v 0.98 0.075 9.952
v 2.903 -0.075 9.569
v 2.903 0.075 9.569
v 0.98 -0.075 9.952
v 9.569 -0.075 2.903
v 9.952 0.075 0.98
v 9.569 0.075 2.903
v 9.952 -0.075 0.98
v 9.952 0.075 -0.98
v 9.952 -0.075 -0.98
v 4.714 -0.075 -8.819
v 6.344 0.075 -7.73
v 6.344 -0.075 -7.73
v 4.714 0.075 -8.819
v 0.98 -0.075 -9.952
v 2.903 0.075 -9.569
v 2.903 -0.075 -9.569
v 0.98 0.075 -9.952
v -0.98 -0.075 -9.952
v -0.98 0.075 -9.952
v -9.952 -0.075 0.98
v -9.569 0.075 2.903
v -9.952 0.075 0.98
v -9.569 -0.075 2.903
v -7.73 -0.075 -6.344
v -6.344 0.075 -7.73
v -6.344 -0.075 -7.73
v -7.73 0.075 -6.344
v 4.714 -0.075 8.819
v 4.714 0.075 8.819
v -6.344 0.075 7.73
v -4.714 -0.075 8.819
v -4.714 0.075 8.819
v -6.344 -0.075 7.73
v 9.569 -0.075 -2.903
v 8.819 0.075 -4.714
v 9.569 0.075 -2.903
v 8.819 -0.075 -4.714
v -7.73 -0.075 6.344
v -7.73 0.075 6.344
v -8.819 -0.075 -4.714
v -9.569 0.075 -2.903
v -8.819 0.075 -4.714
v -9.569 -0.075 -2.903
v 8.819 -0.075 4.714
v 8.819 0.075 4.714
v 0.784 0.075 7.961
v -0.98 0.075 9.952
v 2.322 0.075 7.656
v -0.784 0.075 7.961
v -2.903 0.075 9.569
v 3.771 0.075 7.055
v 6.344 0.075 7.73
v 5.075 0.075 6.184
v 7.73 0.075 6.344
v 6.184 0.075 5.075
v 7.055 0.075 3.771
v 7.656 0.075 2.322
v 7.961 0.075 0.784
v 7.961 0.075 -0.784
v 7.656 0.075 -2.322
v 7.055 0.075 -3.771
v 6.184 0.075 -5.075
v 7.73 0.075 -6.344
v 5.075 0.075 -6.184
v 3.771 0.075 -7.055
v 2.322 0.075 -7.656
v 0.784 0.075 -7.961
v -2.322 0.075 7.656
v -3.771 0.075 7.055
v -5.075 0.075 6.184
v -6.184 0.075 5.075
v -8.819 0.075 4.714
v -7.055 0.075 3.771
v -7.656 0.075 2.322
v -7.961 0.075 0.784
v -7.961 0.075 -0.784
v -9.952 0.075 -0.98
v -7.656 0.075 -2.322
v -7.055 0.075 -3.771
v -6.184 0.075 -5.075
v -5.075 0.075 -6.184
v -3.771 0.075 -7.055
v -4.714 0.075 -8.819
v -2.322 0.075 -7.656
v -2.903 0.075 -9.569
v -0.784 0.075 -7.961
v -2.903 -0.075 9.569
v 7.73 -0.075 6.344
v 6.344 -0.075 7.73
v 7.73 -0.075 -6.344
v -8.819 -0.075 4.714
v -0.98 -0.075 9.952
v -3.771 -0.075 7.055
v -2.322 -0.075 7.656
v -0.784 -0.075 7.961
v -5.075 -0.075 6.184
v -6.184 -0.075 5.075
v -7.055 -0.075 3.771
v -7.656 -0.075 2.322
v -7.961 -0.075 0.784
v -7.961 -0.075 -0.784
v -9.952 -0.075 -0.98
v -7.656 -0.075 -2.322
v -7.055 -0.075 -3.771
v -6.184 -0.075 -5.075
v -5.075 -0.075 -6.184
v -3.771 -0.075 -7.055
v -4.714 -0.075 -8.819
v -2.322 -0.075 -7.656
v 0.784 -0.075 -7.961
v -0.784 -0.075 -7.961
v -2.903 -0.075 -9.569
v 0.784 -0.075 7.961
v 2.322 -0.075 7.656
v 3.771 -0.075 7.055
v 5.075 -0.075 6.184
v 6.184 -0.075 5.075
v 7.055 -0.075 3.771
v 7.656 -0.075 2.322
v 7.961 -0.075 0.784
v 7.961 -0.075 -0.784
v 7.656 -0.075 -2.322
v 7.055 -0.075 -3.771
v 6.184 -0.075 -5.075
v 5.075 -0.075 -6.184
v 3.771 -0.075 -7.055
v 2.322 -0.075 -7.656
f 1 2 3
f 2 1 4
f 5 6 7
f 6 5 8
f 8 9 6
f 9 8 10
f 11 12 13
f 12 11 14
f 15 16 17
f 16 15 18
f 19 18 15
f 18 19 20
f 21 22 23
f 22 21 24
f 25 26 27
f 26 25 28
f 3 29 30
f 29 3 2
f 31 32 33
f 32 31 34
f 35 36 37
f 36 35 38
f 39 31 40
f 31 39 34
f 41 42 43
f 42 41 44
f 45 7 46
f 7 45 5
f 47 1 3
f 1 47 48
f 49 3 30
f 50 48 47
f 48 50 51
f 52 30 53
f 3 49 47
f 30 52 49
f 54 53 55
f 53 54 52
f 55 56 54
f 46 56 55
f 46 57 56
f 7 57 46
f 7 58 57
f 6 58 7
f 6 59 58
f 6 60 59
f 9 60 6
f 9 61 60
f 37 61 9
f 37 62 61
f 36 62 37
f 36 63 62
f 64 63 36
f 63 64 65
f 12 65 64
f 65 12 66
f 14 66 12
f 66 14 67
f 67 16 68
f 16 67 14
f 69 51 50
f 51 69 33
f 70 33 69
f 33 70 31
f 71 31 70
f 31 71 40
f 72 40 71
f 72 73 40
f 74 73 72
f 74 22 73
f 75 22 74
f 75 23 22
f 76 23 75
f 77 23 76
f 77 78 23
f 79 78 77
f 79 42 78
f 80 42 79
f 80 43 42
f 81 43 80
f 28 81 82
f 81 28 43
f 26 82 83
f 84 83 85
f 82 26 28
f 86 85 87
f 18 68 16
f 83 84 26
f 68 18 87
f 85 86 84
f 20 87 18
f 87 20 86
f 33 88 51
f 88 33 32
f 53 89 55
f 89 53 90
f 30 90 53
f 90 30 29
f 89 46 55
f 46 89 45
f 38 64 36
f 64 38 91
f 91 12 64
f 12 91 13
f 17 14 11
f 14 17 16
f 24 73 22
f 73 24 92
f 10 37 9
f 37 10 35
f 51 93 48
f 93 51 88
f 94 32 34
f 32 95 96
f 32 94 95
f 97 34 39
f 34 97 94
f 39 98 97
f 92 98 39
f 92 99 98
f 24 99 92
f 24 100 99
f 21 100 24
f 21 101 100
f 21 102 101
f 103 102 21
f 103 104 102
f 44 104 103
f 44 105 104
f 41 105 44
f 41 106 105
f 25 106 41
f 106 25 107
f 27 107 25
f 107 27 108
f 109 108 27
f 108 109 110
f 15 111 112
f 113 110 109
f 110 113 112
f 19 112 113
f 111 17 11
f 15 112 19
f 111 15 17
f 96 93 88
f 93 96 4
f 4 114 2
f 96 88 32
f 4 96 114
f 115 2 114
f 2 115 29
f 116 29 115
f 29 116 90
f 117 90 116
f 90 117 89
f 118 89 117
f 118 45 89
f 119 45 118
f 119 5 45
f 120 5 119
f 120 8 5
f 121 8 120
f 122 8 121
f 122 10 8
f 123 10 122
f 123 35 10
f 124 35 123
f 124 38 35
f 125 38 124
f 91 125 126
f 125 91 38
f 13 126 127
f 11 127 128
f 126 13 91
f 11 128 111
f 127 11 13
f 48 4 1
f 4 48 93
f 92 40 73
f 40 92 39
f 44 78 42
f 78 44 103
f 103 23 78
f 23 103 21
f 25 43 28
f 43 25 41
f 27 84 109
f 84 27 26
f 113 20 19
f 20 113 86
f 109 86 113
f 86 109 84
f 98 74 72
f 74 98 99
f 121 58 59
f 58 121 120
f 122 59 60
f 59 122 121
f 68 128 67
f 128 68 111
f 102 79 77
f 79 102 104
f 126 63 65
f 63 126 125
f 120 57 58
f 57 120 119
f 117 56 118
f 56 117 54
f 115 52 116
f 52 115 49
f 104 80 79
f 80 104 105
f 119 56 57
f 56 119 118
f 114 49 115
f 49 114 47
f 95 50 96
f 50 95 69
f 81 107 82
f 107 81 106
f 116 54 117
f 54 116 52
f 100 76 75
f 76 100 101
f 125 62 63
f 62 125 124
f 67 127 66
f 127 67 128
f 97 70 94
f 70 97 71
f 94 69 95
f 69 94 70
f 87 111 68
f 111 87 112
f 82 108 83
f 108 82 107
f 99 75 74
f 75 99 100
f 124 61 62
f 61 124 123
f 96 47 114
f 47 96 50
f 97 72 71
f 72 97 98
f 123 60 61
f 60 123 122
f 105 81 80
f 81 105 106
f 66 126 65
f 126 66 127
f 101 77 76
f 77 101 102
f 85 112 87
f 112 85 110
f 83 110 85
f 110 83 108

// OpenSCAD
table_sections = 32;
table_radius = 9;

rotate([0, (360.0 / table_sections) / 2, 0]) {
    rotate([90, 0, 0]) {
        difference() {
            cylinder(h = 0.15, r1 = table_radius + 1, r2 = table_radius + 1, center = true, $fn=table_sections);
            cylinder(h = 0.2, r1 = table_radius - 1, r2 = table_radius - 1, center = true, $fn=table_sections);
        }
    }
}
